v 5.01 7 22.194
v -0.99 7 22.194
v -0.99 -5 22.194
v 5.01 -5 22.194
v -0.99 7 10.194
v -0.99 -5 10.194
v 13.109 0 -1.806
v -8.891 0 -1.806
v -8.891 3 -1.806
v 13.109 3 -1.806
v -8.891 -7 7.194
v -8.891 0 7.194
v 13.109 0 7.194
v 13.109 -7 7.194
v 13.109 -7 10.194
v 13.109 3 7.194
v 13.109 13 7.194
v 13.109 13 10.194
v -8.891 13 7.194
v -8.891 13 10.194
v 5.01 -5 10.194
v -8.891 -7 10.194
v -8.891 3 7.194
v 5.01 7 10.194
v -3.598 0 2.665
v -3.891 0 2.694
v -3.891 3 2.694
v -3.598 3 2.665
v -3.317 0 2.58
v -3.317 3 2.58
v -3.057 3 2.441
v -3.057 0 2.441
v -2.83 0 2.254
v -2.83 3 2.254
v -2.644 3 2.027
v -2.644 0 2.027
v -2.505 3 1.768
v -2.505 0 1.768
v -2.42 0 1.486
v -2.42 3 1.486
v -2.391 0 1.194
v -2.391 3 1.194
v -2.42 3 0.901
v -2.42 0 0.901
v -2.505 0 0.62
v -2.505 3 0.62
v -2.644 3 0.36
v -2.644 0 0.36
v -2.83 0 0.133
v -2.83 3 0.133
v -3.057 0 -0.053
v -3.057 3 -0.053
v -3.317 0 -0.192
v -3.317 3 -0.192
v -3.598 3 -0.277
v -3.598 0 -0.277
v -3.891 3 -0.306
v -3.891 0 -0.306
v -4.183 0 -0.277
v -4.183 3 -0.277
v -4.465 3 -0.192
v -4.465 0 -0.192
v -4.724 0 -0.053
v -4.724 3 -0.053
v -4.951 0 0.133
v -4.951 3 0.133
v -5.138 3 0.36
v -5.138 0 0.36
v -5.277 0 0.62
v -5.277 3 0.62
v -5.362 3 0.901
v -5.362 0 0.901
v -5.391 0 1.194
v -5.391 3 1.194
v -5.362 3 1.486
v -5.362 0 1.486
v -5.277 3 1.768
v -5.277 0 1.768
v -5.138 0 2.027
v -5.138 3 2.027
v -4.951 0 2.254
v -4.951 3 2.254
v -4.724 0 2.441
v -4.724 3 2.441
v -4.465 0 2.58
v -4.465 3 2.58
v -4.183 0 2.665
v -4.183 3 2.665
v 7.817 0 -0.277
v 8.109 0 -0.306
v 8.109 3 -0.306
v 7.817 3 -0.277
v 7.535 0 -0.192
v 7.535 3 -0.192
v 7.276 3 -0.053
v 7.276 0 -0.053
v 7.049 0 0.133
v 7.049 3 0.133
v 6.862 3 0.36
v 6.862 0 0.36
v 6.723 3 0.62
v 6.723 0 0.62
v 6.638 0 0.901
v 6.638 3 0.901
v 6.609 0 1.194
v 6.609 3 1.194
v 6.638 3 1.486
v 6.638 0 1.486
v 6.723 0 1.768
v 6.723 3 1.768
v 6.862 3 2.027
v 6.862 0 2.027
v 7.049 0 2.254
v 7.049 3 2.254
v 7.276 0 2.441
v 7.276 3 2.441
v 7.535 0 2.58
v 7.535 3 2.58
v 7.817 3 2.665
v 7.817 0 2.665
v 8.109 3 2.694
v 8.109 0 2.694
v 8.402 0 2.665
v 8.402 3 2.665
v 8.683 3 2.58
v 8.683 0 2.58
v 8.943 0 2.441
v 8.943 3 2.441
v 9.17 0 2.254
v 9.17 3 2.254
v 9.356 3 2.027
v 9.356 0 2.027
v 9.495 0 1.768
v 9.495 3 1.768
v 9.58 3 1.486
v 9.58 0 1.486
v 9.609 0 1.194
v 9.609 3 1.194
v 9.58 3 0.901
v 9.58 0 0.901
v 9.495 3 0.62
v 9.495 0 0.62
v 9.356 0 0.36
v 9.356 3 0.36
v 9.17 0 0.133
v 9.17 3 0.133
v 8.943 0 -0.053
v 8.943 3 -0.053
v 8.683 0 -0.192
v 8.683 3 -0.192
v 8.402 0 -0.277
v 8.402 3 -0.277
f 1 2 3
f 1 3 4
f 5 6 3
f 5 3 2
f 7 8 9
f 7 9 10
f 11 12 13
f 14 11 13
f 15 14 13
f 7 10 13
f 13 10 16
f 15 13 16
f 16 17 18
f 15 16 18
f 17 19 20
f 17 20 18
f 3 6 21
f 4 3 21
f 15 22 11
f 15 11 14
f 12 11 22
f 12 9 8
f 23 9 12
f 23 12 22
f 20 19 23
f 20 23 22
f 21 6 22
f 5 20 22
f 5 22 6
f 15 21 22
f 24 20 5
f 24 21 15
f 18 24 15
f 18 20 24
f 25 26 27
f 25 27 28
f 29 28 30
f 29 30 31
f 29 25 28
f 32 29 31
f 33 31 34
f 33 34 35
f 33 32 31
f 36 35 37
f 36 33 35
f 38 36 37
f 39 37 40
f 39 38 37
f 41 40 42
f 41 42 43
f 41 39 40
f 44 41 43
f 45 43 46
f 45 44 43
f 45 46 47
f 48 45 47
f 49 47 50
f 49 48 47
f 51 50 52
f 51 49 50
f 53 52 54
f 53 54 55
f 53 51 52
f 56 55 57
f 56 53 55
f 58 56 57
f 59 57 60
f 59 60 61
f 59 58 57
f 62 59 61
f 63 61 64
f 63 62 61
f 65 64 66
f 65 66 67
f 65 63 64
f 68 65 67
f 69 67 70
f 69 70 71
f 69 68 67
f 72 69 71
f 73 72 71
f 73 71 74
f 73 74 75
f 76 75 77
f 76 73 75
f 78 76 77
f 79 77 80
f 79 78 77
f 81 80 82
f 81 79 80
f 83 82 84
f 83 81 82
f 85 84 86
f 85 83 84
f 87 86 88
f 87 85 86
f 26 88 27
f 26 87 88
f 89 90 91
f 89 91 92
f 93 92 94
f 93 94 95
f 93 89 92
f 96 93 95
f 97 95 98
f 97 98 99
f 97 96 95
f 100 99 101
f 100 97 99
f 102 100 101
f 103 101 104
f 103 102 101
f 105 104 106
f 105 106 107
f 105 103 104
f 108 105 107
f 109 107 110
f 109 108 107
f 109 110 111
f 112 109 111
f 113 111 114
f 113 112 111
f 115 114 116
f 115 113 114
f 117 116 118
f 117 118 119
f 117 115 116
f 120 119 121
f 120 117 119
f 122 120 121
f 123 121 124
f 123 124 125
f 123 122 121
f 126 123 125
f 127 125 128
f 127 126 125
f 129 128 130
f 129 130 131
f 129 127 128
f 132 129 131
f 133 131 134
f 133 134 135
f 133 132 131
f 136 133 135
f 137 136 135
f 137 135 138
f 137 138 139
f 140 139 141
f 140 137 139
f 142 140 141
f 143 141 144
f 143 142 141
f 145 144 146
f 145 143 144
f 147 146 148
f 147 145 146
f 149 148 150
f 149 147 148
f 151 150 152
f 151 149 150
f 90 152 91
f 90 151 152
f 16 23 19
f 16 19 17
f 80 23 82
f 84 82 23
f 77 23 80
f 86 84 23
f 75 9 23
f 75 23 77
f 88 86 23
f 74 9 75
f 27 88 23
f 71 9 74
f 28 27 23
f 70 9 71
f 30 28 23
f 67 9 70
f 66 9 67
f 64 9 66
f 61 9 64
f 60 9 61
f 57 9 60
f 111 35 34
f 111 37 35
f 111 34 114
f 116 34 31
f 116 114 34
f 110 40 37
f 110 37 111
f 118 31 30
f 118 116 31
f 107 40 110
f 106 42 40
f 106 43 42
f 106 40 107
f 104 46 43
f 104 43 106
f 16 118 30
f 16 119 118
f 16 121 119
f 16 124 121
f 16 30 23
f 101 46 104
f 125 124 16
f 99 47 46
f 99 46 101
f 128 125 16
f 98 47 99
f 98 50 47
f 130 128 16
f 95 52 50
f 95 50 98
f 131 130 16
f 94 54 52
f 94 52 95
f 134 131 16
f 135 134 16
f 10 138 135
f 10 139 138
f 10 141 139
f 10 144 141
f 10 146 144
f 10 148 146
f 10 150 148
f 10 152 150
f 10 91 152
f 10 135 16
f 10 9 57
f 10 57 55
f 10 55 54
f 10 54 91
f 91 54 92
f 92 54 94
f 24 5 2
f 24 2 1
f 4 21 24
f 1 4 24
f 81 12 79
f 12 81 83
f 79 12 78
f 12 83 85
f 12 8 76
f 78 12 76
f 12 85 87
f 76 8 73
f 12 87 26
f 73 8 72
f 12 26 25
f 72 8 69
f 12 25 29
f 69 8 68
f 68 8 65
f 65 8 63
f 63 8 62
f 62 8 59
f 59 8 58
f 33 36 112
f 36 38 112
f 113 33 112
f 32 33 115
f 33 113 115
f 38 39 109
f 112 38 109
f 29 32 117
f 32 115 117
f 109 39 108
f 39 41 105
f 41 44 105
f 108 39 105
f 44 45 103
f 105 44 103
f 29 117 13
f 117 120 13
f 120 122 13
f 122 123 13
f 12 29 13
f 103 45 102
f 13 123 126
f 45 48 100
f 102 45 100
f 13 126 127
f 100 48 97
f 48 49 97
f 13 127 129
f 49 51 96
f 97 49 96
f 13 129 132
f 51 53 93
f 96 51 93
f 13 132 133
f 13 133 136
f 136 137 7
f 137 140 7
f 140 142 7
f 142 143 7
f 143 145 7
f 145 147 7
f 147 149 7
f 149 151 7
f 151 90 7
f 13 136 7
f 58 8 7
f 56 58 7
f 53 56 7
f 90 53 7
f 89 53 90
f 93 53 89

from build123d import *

# Parameters (mm, degrees)
ESQUISSE1_W        = 22
ESQUISSE1_H        = 7
ESQUISSE1_R        = 1.5
BOSS_EXTRU_1_DEPTH = 3
ESQUISSE4_W        = 22
ESQUISSE4_H        = 3
BOSS_EXTRU_2_DEPTH = 5
ESQUISSE5_W        = 22
ESQUISSE5_H        = 3
BOSS_EXTRU_3_DEPTH = 10
ESQUISSE6_W        = 22
ESQUISSE6_H        = 3
BOSS_EXTRU_4_DEPTH = 7
ESQUISSE7_W        = 6
ESQUISSE7_H        = 12
BOSS_EXTRU_5_DEPTH = 12


with BuildPart() as part:
    # Esquisse1 → Boss.-Extru.1 (new body)
    with BuildSketch(Plane(origin=(0, 0, 0), x_dir=(1, 0, 0), z_dir=(0, 1, 0))):
        with Locations((2.109278351, -1.693814433)):
            Rectangle(ESQUISSE1_W, ESQUISSE1_H)
        with Locations(Location((-3.890721649, -1.193814433, 0), (0, 0, 270))):
            Circle(ESQUISSE1_R, mode=Mode.SUBTRACT)
        with Locations(Location((8.109278351, -1.193814433, 0), (0, 0, 90))):
            Circle(ESQUISSE1_R, mode=Mode.SUBTRACT)
    extrude(amount=BOSS_EXTRU_1_DEPTH)

    # Esquisse4 → Boss.-Extru.2 (add)
    with BuildSketch(Plane.XY.offset(5.193814433)):
        with Locations((2.109278351, 1.5)):
            Rectangle(ESQUISSE4_W, ESQUISSE4_H)
    extrude(amount=BOSS_EXTRU_2_DEPTH)

    # Esquisse5 → Boss.-Extru.3 (add)
    with BuildSketch(Plane(origin=(0, 3, 0), x_dir=(1, 0, 0), z_dir=(0, 1, 0))):
        with Locations((2.109278351, -8.693814433)):
            Rectangle(ESQUISSE5_W, ESQUISSE5_H)
    extrude(amount=BOSS_EXTRU_3_DEPTH)

    # Esquisse6 → Boss.-Extru.4 (add)
    with BuildSketch(Plane.XZ):
        with Locations((2.109278351, 8.693814433)):
            Rectangle(ESQUISSE6_W, ESQUISSE6_H)
    extrude(amount=BOSS_EXTRU_4_DEPTH)

    # Esquisse7 → Boss.-Extru.5 (add)
    with BuildSketch(Plane.XY.offset(10.193814433)):
        with Locations((2.009802238, 1)):
            Rectangle(ESQUISSE7_W, ESQUISSE7_H)
    extrude(amount=BOSS_EXTRU_5_DEPTH)


solid = part.part
